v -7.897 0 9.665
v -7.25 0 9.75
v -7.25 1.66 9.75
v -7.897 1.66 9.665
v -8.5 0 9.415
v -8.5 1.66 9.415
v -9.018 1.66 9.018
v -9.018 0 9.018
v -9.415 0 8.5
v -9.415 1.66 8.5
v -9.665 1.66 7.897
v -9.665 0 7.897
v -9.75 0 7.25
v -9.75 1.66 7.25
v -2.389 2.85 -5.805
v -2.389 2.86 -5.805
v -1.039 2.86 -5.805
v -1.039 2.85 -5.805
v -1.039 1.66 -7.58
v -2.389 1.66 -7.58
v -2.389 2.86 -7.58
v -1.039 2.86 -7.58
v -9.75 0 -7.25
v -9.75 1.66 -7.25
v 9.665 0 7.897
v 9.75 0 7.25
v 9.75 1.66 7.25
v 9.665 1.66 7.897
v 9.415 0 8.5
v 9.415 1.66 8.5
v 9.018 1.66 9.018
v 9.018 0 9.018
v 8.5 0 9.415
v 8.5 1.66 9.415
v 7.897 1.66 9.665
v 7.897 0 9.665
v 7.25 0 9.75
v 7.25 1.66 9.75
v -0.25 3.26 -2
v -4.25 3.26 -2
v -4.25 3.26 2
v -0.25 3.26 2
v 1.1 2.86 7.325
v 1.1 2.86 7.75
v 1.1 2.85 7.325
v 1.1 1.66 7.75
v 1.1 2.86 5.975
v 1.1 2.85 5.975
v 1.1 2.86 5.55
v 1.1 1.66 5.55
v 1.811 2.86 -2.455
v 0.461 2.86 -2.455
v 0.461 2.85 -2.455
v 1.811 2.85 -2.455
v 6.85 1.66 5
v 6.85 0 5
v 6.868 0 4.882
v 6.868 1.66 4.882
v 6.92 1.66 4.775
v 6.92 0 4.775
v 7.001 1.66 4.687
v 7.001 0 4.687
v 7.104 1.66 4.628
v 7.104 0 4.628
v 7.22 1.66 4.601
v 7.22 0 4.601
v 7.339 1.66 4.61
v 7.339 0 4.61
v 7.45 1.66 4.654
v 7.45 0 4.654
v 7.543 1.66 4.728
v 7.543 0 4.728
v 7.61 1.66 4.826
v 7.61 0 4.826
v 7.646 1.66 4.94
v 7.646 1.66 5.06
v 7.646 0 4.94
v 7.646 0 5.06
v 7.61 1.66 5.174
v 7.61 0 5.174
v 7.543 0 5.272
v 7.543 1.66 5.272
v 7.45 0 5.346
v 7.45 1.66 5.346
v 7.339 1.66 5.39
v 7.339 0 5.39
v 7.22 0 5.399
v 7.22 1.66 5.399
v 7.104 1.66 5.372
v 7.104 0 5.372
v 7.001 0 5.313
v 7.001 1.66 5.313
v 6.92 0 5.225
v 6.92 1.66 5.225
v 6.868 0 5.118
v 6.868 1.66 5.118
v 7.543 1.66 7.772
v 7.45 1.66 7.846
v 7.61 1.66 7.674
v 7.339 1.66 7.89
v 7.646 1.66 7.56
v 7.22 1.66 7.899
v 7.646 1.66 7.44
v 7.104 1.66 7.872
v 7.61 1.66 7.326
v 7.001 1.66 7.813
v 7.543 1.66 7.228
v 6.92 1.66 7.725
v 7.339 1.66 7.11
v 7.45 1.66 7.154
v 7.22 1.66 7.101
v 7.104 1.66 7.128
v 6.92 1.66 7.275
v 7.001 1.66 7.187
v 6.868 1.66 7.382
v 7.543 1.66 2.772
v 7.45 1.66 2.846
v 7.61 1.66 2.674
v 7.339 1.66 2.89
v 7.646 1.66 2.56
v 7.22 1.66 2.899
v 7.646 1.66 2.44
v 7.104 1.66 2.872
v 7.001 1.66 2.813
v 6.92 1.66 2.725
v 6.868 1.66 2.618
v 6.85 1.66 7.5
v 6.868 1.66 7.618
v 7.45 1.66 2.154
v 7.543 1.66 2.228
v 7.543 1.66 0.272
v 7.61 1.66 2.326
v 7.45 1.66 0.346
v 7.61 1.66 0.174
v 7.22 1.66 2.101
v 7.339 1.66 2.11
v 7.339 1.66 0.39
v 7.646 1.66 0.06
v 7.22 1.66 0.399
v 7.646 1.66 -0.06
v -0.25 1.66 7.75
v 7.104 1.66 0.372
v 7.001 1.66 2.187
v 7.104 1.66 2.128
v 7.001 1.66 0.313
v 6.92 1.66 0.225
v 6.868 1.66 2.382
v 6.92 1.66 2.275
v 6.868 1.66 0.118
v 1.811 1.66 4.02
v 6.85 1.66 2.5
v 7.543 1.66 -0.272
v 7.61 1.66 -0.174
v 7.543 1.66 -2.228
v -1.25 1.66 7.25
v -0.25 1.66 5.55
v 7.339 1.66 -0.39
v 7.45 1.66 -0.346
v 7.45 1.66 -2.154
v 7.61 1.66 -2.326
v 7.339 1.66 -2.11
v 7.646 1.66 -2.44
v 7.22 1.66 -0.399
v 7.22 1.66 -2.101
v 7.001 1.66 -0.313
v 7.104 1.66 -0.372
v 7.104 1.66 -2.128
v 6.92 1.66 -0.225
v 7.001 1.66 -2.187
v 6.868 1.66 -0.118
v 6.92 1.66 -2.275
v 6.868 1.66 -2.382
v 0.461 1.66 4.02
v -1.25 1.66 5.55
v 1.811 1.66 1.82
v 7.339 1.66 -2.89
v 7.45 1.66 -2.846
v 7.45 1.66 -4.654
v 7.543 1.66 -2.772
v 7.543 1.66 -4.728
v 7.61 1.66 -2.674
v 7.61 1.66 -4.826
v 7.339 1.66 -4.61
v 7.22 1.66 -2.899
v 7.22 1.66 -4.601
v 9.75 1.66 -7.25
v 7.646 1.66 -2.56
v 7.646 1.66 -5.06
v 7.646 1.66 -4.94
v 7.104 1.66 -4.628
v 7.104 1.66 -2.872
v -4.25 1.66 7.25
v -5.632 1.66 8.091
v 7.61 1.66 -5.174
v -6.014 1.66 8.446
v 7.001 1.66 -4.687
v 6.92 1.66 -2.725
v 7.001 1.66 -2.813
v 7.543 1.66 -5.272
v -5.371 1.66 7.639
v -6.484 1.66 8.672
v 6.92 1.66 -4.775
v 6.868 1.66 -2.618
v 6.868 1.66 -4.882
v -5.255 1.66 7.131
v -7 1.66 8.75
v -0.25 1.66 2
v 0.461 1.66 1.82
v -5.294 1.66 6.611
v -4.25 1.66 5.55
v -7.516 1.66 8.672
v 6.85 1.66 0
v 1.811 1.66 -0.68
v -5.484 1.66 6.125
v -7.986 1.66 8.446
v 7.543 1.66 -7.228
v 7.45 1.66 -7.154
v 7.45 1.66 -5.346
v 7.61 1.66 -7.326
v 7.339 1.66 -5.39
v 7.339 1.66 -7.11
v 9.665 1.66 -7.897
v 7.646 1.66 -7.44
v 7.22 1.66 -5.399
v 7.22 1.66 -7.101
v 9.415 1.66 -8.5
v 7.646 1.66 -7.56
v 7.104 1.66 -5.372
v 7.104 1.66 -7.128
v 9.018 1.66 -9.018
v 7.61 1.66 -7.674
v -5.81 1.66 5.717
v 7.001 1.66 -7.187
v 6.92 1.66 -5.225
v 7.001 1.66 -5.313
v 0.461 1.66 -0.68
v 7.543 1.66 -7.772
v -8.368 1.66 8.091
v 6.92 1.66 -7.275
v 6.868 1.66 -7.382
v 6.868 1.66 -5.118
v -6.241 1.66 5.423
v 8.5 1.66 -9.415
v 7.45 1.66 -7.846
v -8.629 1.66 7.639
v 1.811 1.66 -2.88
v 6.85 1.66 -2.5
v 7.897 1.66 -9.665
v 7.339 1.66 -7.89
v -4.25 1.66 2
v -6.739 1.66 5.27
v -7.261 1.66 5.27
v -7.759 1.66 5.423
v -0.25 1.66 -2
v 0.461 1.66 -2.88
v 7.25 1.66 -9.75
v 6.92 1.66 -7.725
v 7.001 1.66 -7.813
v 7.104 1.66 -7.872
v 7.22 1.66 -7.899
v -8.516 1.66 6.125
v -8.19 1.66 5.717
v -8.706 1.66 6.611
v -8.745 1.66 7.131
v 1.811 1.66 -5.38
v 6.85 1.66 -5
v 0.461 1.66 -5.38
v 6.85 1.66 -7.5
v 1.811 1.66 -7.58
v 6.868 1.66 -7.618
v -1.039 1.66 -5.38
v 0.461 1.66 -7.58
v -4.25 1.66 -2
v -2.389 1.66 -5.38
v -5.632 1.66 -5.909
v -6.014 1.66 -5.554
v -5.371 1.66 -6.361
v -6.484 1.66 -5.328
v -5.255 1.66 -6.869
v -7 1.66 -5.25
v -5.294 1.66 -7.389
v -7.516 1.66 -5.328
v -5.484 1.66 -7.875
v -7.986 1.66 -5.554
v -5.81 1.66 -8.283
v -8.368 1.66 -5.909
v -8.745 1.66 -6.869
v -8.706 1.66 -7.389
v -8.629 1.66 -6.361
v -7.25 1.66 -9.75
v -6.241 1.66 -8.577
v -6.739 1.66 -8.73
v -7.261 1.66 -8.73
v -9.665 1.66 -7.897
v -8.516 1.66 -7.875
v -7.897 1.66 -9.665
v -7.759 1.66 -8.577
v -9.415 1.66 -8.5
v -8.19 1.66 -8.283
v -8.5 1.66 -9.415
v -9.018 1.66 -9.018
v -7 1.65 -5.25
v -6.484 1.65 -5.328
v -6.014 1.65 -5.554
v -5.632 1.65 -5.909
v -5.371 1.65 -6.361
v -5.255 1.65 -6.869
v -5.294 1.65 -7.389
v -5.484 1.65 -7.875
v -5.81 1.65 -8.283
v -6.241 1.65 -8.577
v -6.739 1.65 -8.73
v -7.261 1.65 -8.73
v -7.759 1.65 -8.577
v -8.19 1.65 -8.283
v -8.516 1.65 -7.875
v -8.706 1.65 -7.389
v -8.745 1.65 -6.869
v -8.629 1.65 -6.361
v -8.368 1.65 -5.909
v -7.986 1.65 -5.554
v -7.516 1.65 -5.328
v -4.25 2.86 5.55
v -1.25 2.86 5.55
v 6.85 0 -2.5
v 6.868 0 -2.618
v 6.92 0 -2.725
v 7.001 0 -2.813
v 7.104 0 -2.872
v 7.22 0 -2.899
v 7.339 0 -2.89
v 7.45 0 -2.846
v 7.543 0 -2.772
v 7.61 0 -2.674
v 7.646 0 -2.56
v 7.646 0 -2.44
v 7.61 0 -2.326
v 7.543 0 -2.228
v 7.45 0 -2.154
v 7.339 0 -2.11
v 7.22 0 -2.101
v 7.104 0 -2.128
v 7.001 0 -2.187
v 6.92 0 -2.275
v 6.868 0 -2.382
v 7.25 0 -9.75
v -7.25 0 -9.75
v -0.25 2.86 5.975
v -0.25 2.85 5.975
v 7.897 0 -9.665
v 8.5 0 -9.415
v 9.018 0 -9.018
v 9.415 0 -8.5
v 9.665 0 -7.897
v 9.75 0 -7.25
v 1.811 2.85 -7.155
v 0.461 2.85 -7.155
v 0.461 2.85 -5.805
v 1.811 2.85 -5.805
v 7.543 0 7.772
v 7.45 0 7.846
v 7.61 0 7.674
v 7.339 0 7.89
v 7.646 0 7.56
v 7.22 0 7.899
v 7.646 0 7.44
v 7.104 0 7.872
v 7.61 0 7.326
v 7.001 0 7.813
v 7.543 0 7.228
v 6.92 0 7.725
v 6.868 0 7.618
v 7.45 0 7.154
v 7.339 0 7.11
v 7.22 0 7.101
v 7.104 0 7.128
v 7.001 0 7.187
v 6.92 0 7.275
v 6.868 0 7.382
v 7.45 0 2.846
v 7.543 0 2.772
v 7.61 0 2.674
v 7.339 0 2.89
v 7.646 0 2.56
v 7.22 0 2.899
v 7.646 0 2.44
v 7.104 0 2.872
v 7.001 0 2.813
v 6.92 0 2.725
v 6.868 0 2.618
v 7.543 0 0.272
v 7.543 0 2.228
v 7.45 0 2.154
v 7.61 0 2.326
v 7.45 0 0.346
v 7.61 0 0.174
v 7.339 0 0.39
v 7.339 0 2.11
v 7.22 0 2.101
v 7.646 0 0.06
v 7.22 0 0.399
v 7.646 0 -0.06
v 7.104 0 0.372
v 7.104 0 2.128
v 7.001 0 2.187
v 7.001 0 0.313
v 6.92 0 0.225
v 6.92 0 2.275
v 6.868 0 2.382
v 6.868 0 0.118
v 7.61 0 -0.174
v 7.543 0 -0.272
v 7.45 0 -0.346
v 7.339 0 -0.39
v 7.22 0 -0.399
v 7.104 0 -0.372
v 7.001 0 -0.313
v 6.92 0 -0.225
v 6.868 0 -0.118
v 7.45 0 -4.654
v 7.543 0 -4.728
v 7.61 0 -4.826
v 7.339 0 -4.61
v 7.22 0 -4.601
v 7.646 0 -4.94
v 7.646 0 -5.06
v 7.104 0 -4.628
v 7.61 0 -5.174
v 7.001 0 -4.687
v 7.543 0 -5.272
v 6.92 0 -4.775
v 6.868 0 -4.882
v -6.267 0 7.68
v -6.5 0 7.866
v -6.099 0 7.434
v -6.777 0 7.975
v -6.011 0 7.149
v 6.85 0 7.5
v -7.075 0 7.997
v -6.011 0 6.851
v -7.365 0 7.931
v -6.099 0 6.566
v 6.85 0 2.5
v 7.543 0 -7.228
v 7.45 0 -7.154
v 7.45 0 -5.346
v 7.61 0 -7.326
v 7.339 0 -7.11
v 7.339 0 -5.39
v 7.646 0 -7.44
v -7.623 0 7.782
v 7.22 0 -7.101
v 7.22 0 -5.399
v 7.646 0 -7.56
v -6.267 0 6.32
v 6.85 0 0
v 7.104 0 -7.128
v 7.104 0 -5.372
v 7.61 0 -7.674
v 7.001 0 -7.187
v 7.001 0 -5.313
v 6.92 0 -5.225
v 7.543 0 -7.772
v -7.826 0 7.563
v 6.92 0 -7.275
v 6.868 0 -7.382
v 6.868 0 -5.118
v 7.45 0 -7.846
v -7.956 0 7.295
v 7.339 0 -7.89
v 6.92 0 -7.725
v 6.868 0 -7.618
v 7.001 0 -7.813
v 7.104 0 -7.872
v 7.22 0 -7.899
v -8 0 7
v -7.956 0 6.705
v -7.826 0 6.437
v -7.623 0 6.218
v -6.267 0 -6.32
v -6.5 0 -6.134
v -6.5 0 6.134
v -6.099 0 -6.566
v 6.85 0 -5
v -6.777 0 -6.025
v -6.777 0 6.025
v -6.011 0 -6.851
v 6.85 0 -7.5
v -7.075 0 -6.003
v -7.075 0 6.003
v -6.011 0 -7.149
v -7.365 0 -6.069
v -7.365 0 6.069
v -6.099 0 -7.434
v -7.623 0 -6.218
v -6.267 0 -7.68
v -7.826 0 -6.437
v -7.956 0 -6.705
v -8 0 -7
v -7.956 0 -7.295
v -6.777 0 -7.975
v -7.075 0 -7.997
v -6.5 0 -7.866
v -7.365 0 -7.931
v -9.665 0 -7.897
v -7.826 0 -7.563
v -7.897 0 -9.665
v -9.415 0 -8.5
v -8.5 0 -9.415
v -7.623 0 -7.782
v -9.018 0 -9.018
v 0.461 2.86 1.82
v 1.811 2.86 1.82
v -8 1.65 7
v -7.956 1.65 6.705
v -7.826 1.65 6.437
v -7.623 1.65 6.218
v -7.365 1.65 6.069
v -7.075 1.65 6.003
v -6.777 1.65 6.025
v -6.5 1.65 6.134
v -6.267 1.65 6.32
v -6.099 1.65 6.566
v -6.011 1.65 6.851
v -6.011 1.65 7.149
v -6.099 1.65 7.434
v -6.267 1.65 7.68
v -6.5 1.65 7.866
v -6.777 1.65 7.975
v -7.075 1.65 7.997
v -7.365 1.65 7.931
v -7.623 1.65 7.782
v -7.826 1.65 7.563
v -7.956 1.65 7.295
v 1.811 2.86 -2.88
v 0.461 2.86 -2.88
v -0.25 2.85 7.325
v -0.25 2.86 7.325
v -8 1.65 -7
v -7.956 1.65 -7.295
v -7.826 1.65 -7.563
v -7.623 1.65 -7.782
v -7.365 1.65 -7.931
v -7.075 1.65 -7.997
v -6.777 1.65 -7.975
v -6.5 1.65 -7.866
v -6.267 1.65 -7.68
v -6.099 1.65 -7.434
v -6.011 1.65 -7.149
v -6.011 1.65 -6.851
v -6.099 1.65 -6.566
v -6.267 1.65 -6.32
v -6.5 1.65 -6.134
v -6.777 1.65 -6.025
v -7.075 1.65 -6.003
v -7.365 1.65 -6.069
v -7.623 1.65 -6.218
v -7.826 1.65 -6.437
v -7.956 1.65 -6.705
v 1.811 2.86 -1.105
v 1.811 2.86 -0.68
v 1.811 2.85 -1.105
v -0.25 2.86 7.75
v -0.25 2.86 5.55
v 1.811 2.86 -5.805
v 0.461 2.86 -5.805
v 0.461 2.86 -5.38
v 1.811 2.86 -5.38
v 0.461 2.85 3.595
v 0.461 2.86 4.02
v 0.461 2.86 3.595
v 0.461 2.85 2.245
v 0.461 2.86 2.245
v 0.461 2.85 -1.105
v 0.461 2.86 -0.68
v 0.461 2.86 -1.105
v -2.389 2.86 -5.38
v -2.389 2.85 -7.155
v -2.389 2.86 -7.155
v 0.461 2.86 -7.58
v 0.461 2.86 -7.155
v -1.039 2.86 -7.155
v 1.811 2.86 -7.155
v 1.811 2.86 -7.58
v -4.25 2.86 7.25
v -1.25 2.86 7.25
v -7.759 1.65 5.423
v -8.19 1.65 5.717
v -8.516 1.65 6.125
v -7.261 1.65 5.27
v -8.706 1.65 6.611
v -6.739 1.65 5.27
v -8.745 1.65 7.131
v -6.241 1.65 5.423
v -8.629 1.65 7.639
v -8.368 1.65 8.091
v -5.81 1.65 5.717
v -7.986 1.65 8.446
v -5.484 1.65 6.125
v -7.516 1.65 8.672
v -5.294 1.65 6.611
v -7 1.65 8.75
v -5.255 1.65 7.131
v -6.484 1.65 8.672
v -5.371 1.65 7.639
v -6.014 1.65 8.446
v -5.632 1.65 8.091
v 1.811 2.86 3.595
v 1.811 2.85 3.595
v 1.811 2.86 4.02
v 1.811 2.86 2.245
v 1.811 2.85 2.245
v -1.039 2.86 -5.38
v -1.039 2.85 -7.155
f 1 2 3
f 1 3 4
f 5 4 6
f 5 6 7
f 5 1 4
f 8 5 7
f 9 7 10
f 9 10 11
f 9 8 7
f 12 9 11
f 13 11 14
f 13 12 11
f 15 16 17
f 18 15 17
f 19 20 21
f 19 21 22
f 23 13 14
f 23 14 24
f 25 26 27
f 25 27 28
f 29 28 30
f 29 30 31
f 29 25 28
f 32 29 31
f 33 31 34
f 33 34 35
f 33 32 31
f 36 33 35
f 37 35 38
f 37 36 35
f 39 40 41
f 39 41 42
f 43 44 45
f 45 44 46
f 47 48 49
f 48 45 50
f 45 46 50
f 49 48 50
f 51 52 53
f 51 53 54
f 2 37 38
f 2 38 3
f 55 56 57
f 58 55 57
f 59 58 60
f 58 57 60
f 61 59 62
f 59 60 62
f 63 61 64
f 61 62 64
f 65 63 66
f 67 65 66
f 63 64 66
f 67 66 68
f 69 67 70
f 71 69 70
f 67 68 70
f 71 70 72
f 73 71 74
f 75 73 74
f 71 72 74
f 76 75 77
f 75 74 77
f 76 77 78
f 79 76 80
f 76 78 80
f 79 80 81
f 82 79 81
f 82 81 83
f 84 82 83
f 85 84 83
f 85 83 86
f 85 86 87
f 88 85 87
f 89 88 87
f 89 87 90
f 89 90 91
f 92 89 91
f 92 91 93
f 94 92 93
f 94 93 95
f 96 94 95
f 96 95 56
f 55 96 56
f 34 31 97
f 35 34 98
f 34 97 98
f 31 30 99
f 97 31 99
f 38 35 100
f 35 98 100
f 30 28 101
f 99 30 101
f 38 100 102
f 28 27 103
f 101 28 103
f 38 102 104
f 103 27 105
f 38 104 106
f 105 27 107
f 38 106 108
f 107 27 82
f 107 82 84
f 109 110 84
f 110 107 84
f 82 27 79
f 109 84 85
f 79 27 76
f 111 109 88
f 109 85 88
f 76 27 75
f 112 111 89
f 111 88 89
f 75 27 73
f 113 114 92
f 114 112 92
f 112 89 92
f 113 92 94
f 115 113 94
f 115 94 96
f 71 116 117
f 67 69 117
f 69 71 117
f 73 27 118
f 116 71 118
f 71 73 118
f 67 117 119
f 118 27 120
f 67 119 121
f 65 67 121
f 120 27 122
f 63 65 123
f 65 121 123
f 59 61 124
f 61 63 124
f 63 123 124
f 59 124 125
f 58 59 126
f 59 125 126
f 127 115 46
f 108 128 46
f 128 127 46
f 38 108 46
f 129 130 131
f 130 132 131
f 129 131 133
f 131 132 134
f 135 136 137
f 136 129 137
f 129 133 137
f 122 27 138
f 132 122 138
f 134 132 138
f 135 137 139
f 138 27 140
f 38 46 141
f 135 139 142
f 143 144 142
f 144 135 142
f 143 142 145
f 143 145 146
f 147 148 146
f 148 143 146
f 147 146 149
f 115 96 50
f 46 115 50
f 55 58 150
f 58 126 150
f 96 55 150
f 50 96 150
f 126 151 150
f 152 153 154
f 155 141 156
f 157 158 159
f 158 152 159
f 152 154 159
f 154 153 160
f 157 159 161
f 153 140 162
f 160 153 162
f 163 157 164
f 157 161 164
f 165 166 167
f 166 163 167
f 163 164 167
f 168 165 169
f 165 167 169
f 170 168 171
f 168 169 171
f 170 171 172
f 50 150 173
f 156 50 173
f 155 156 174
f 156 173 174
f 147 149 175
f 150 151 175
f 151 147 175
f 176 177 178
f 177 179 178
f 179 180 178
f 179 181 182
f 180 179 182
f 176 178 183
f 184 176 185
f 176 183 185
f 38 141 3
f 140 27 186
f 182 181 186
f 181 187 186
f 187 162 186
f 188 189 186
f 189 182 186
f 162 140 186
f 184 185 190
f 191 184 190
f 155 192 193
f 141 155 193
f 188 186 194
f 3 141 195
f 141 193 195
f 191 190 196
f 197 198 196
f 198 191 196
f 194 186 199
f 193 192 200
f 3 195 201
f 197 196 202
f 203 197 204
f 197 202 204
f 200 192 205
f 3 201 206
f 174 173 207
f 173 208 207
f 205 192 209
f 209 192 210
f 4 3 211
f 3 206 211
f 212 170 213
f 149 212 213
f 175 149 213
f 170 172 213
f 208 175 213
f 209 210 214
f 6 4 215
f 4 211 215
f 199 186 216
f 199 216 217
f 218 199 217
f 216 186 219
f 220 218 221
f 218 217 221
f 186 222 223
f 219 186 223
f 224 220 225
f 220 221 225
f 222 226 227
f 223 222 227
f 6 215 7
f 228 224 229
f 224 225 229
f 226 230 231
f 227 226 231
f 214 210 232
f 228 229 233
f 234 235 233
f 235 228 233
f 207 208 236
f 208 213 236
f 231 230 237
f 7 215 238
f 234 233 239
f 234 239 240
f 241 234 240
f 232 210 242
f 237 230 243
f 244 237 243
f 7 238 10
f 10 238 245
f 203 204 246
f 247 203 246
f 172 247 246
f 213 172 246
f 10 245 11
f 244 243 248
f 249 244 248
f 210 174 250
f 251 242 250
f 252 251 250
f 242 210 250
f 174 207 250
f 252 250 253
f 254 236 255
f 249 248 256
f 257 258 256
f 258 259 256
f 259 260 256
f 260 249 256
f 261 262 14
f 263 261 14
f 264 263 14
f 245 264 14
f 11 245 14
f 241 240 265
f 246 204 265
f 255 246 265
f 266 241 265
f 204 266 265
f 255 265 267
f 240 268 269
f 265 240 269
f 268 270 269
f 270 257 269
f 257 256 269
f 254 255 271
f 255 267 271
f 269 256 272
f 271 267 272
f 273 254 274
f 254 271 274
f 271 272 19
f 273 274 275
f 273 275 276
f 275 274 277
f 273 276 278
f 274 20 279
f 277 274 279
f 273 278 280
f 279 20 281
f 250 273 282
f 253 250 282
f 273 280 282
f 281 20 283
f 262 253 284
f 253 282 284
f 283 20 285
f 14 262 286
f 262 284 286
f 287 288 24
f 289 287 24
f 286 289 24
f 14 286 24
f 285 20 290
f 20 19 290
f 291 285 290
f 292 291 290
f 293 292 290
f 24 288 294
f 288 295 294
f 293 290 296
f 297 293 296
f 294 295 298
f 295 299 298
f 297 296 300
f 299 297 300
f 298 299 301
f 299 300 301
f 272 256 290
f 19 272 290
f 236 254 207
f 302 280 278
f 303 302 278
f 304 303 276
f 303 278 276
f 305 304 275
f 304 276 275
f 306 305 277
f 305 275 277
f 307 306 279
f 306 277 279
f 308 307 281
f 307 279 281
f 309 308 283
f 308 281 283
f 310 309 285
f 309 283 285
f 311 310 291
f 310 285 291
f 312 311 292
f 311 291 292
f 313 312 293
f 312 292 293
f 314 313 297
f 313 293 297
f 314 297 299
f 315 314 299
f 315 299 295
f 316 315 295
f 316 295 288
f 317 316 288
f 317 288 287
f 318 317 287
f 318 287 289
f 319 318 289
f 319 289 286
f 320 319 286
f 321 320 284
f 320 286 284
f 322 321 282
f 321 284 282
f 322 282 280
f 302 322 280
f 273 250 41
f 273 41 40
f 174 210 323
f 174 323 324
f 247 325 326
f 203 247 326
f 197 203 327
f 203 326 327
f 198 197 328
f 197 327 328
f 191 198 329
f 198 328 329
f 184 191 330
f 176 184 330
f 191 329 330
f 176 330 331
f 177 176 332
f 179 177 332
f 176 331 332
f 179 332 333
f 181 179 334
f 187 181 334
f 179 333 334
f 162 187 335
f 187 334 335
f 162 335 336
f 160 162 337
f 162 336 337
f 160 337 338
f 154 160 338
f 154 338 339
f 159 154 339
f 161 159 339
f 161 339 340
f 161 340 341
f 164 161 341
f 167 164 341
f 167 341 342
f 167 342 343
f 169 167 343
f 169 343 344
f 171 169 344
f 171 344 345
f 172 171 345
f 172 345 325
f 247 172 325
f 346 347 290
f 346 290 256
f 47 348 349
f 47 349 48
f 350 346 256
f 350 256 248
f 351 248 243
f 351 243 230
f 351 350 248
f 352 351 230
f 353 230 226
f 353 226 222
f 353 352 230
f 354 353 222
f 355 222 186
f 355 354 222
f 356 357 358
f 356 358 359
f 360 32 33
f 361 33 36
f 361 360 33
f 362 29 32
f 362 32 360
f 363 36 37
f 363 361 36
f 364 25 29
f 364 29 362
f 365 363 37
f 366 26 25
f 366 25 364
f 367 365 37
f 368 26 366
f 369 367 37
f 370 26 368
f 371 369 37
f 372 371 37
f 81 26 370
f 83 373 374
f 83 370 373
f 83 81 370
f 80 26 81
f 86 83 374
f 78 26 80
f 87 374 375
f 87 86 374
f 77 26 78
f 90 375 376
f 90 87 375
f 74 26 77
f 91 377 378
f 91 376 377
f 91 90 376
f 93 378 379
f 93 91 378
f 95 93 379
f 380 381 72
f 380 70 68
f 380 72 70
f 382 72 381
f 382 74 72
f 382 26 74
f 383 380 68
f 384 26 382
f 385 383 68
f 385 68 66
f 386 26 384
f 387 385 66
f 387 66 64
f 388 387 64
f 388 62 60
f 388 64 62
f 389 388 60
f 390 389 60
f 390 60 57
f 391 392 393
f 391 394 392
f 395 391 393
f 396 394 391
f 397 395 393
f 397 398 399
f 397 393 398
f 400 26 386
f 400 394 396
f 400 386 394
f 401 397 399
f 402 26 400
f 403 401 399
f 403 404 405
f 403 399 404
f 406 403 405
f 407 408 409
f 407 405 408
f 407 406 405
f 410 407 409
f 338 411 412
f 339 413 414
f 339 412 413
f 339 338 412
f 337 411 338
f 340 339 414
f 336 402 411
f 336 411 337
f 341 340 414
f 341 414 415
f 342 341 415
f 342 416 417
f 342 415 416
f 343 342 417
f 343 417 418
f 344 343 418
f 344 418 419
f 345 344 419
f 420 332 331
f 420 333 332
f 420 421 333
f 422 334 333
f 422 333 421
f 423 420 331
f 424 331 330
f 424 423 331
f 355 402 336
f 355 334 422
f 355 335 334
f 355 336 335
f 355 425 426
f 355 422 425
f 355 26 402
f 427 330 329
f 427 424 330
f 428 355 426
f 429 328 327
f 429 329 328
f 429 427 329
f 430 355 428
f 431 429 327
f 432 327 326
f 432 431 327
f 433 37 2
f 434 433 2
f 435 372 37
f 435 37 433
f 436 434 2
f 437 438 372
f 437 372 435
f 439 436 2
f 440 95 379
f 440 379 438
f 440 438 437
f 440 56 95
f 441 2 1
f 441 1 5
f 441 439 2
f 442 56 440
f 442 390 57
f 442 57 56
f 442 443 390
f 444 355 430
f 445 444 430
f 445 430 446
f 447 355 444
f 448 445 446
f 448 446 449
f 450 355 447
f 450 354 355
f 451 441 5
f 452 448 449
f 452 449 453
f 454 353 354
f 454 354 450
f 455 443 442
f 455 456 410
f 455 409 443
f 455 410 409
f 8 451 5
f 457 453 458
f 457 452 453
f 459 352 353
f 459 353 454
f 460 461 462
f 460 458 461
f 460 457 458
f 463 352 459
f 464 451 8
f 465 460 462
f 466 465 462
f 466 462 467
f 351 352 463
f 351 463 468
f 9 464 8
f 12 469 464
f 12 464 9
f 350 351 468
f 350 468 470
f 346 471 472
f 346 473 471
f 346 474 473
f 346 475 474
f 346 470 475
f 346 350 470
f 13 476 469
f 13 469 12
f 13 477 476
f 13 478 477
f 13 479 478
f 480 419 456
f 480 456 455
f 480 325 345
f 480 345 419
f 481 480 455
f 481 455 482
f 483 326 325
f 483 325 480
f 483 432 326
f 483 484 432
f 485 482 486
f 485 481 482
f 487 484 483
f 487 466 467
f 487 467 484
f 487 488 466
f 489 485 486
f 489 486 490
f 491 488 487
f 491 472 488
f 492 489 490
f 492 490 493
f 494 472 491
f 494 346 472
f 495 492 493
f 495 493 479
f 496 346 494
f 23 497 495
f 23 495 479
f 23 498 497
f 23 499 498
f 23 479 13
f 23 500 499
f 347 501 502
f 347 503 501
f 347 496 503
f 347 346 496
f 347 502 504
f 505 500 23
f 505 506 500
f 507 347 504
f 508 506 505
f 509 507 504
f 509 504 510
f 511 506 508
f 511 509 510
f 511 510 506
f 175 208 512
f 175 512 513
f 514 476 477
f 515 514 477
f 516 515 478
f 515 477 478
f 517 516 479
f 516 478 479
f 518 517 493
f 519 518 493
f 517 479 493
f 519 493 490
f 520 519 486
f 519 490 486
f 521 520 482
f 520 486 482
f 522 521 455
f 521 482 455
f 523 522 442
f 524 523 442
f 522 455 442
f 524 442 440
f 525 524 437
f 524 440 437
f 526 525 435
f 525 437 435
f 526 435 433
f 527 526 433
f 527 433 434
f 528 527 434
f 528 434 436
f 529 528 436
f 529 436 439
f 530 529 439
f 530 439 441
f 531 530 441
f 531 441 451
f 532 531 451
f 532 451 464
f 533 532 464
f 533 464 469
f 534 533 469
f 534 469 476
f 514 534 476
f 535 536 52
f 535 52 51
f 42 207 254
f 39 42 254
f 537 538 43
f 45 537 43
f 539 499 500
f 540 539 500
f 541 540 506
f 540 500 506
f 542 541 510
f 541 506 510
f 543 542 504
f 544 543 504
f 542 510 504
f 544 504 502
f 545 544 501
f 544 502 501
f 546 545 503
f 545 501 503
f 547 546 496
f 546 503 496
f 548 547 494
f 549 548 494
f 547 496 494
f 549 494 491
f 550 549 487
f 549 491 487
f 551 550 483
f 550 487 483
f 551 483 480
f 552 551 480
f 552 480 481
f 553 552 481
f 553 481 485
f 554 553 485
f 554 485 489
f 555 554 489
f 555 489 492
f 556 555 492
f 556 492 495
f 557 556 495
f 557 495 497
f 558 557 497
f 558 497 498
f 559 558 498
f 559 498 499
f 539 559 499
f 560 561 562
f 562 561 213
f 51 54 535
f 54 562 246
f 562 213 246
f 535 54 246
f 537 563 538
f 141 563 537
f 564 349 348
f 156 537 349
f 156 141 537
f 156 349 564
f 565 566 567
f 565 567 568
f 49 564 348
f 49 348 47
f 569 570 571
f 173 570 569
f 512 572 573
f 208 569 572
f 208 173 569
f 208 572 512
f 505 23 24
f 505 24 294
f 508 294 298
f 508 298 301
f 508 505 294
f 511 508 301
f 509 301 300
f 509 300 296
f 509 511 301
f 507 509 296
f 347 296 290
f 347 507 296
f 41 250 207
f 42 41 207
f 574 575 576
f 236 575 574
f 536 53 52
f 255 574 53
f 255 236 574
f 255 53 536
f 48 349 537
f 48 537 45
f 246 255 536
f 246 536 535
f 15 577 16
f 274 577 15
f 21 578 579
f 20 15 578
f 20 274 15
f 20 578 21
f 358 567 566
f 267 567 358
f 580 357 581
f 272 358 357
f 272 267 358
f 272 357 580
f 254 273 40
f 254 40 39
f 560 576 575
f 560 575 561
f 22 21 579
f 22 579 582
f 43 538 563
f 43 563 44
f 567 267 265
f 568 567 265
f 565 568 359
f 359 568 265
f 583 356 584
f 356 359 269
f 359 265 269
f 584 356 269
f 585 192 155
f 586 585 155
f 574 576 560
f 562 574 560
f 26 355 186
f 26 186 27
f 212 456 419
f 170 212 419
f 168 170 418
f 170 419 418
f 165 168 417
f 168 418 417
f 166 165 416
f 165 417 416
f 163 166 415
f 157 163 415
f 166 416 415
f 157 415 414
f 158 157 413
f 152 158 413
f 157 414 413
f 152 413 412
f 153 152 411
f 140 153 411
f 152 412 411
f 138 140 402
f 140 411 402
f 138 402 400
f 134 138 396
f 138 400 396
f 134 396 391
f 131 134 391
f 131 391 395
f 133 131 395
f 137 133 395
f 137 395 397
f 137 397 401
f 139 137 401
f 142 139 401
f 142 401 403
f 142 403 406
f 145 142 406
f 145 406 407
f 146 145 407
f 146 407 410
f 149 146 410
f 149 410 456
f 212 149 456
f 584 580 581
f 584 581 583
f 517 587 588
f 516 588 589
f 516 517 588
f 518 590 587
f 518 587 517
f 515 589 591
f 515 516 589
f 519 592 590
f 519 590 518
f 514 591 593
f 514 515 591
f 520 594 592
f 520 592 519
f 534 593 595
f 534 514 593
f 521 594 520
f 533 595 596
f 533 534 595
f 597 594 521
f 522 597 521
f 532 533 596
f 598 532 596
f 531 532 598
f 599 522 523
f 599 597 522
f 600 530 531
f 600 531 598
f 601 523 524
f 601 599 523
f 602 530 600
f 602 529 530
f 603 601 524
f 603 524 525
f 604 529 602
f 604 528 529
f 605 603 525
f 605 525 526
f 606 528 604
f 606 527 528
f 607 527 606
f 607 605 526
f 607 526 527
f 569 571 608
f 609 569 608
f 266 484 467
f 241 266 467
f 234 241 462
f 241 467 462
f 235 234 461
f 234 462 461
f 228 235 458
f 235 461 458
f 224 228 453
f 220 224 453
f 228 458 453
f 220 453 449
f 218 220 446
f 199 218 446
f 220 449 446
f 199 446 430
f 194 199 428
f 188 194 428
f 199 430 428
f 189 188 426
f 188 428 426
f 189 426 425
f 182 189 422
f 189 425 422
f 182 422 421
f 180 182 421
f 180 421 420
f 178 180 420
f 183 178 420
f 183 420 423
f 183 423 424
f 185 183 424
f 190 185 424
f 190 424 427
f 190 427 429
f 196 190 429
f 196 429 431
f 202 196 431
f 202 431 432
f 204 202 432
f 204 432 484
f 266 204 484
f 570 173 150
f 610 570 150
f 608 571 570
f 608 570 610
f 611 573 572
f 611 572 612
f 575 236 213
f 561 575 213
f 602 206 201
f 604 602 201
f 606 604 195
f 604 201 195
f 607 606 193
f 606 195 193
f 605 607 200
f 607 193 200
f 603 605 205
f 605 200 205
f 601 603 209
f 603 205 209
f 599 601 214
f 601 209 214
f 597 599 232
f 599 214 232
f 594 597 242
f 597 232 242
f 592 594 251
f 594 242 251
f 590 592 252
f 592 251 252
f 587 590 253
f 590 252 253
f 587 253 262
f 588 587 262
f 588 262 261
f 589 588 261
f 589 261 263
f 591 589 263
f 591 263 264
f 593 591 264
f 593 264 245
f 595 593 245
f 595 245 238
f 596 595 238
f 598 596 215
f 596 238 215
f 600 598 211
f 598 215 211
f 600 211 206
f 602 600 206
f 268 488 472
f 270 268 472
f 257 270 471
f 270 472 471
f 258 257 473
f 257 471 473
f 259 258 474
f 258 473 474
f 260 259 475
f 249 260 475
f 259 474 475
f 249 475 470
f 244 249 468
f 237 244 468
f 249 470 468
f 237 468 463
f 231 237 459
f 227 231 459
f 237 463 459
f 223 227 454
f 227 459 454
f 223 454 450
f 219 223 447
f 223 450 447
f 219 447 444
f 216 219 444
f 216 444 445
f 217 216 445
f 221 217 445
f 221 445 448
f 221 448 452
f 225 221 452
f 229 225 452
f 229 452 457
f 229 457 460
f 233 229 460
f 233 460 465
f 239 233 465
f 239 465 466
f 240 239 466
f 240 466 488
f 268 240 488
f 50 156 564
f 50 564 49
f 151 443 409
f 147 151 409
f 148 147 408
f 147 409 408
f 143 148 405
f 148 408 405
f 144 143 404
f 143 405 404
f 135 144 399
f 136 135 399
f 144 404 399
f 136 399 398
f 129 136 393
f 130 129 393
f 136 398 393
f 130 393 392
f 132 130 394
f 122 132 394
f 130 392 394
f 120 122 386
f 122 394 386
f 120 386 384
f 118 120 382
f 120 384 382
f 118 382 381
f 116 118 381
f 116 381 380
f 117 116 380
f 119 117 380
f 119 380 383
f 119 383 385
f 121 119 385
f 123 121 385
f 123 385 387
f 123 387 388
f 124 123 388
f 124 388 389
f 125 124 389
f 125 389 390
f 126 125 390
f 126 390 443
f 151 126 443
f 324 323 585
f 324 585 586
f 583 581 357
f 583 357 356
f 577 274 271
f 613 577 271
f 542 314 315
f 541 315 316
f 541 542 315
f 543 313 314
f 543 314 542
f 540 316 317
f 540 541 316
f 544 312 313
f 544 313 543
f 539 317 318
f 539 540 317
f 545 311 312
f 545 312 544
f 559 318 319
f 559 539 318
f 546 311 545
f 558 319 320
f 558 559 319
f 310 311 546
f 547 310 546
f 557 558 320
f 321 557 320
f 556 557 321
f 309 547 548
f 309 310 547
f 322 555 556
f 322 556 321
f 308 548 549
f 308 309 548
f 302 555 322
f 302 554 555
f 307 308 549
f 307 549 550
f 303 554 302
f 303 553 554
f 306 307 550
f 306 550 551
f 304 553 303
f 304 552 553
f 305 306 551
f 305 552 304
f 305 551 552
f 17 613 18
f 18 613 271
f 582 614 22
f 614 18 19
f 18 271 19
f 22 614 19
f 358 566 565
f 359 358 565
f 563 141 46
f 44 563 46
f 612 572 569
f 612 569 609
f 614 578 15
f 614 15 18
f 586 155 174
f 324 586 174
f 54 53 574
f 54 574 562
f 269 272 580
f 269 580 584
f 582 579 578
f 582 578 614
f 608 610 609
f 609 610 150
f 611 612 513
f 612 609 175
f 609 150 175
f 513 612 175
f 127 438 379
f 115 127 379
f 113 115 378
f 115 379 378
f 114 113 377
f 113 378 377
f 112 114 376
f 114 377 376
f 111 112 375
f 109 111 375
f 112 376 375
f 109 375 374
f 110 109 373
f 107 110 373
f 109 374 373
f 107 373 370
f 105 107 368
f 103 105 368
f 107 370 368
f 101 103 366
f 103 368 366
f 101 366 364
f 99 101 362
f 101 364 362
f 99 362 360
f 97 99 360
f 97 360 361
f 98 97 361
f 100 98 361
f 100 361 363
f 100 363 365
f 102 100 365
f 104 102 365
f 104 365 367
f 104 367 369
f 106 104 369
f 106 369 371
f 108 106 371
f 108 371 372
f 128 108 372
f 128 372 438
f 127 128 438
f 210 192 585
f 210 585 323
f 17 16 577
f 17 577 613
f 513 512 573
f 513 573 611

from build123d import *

# Parameters (mm, degrees)
BOSS_EXTRU_1_DEPTH              = 1.66
DIAM_TRE_DU_PER_AGE_2_0_2_1_D   = 2
ESQUISSE4_R                     = 1.75
ENL_V_MAT_EXTRU_1_DEPTH         = 0.01
DIAM_TRE_DU_PER_AGE_0_8_0_8_1_D = 0.8
ESQUISSE7_W                     = 4
ESQUISSE7_H                     = 4
BOSS_EXTRU_2_DEPTH              = 1.6
ESQUISSE8_W                     = 3
ESQUISSE8_H                     = 1.7
BOSS_EXTRU_3_DEPTH              = 1.2
ESQUISSE9_W                     = 1.35
ESQUISSE9_H                     = 2.2
BOSS_EXTRU_4_DEPTH              = 1.2
ESQUISSE10_W                    = 1.35
ESQUISSE10_H                    = 1.35
ENL_V_MAT_EXTRU_2_DEPTH         = 0.01
ESQUISSE13_W                    = 1.35
ESQUISSE13_H                    = 2.2
BOSS_EXTRU_6_DEPTH              = 1.2
ESQUISSE15_W                    = 1.35
ESQUISSE15_H                    = 1.35
ENL_V_MAT_EXTRU_3_DEPTH         = 0.01
ESQUISSE18_W                    = 1.35
ESQUISSE18_H                    = 2.2
BOSS_EXTRU_7_DEPTH              = 1.2
ESQUISSE20_W                    = 1.35
ESQUISSE20_H                    = 1.35
ENL_V_MAT_EXTRU_5_DEPTH         = 0.01
ESQUISSE23_W                    = 1.35
ESQUISSE23_H                    = 2.2
BOSS_EXTRU_9_DEPTH              = 1.2
ESQUISSE25_W                    = 1.35
ESQUISSE25_H                    = 1.35
ENL_V_MAT_EXTRU_6_DEPTH         = 0.01
ESQUISSE27_W                    = 1.35
ESQUISSE27_H                    = 2.2
BOSS_EXTRU_10_DEPTH             = 1.2
ESQUISSE29_W                    = 1.35
ESQUISSE29_H                    = 1.35
ENL_V_MAT_EXTRU_7_DEPTH         = 0.01


with BuildPart() as part:
    # Esquisse1 → Boss.-Extru.1 (new body)
    with BuildSketch(Plane(origin=(0, 0, 0), x_dir=(1, 0, 0), z_dir=(0, 1, 0))):
        with BuildLine():
            Line((-7.25, 9.75), (7.25, 9.75))
            ThreePointArc((7.25, 9.75), (9.017766953, 9.017766953), (9.75, 7.25))
            Line((9.75, 7.25), (9.75, -7.25))
            ThreePointArc((9.75, -7.25), (9.017766953, -9.017766953), (7.25, -9.75))
            Line((7.25, -9.75), (-7.25, -9.75))
            ThreePointArc((-7.25, -9.75), (-9.017766953, -9.017766953), (-9.75, -7.25))
            Line((-9.75, -7.25), (-9.75, 7.25))
            ThreePointArc((-9.75, 7.25), (-9.017766953, 9.017766953), (-7.25, 9.75))
        make_face()
    extrude(amount=BOSS_EXTRU_1_DEPTH)

    # Diamètre du perçage Ø2.0 (2)1 (through all)
    with Locations(Plane(origin=(0, 1.66, 0), x_dir=(1, 0, 0), z_dir=(0, 1, 0))):
        with Locations((-7, -7), (-7, 7)):
            Hole(DIAM_TRE_DU_PER_AGE_2_0_2_1_D / 2)

    # Esquisse4 → Enlèv. mat.-Extru.1 (cut)
    with BuildSketch(Plane(origin=(0, 1.66, 0), x_dir=(1, 0, 0), z_dir=(0, 1, 0))):
        with Locations((-7, 7)):
            Circle(ESQUISSE4_R)
        with Locations((-7, -7)):
            Circle(ESQUISSE4_R)
    extrude(amount=-ENL_V_MAT_EXTRU_1_DEPTH, mode=Mode.SUBTRACT)

    # Diamètre du perçage Ø0.8 (0.8)1 (through all)
    with Locations(Plane(origin=(0, 1.66, 0), x_dir=(1, 0, 0), z_dir=(0, 1, 0))):
        with Locations((7.25, 7.5), (7.25, 5), (7.25, 2.5), (7.25, 0), (7.25, -2.5), (7.25, -5), (7.25, -7.5)):
            Hole(DIAM_TRE_DU_PER_AGE_0_8_0_8_1_D / 2)

    # Esquisse7 → Boss.-Extru.2 (add)
    with BuildSketch(Plane(origin=(0, 1.66, 0), x_dir=(1, 0, 0), z_dir=(0, 1, 0))):
        with Locations((-2.25, 0)):
            Rectangle(ESQUISSE7_W, ESQUISSE7_H)
    extrude(amount=BOSS_EXTRU_2_DEPTH)

    # Esquisse8 → Boss.-Extru.3 (add)
    with BuildSketch(Plane(origin=(0, 1.66, 0), x_dir=(1, 0, 0), z_dir=(0, 1, 0))):
        with Locations((-2.75, -6.4)):
            Rectangle(ESQUISSE8_W, ESQUISSE8_H)
    extrude(amount=BOSS_EXTRU_3_DEPTH)

    # Esquisse9 → Boss.-Extru.4 (add)
    with BuildSketch(Plane(origin=(0, 1.66, 0), x_dir=(1, 0, 0), z_dir=(0, 1, 0))):
        with Locations((-1.713640357, 6.480344191)):
            Rectangle(ESQUISSE9_W, ESQUISSE9_H)
    extrude(amount=BOSS_EXTRU_4_DEPTH)

    # Esquisse10 → Enlèv. mat.-Extru.2 (cut)
    with BuildSketch(Plane(origin=(0, 2.86, 0), x_dir=(1, 0, 0), z_dir=(0, 1, 0))):
        with Locations((-1.713640357, 6.480344191)):
            Rectangle(ESQUISSE10_W, ESQUISSE10_H)
    extrude(amount=-ENL_V_MAT_EXTRU_2_DEPTH, mode=Mode.SUBTRACT)

    # Esquisse13 → Boss.-Extru.6 (add)
    with BuildSketch(Plane(origin=(5.041533198, 1.66, 0.171739912), x_dir=(1, 0, 0), z_dir=(0, 1, 0))):
        with Locations((-3.905173555, 6.652084103)):
            Rectangle(ESQUISSE13_W, ESQUISSE13_H)
    extrude(amount=BOSS_EXTRU_6_DEPTH)

    # Esquisse15 → Enlèv. mat.-Extru.3 (cut)
    with BuildSketch(Plane(origin=(5.041533198, 2.86, 0.171739912), x_dir=(1, 0, 0), z_dir=(0, 1, 0))):
        with Locations((-3.905173555, 6.652084103)):
            Rectangle(ESQUISSE15_W, ESQUISSE15_H)
    extrude(amount=-ENL_V_MAT_EXTRU_3_DEPTH, mode=Mode.SUBTRACT)

    # Esquisse18 → Boss.-Extru.7 (add)
    with BuildSketch(Plane(origin=(3.245250957, 1.66, 3.023332502), x_dir=(1, 0, 0), z_dir=(0, 1, 0))):
        with Locations((-2.108891314, 4.803676693)):
            Rectangle(ESQUISSE18_W, ESQUISSE18_H)
    extrude(amount=BOSS_EXTRU_7_DEPTH)

    # Esquisse20 → Enlèv. mat.-Extru.5 (cut)
    with BuildSketch(Plane(origin=(3.245250957, 2.86, 3.023332502), x_dir=(1, 0, 0), z_dir=(0, 1, 0))):
        with Locations((-2.108891314, 4.803676693)):
            Rectangle(ESQUISSE20_W, ESQUISSE20_H)
    extrude(amount=-ENL_V_MAT_EXTRU_5_DEPTH, mode=Mode.SUBTRACT)

    # Esquisse23 → Boss.-Extru.9 (add)
    with BuildSketch(Plane(origin=(5.945511171, 1.66, 6.874523991), x_dir=(1, 0, 0), z_dir=(0, 1, 0))):
        with Locations((-4.809151527, 3.954868182)):
            Rectangle(ESQUISSE23_W, ESQUISSE23_H)
    extrude(amount=BOSS_EXTRU_9_DEPTH)

    # Esquisse25 → Enlèv. mat.-Extru.6 (cut)
    with BuildSketch(Plane(origin=(5.945511171, 2.86, 6.874523991), x_dir=(1, 0, 0), z_dir=(0, 1, 0))):
        with Locations((-4.809151527, 3.954868182)):
            Rectangle(ESQUISSE25_W, ESQUISSE25_H)
    extrude(amount=-ENL_V_MAT_EXTRU_6_DEPTH, mode=Mode.SUBTRACT)

    # Esquisse27 → Boss.-Extru.10 (add)
    with BuildSketch(Plane(origin=(2.244432679, 1.66, 9.735089798), x_dir=(1, 0, 0), z_dir=(0, 1, 0))):
        with Locations((-1.819432679, 3.085089798)):
            Rectangle(ESQUISSE27_W, ESQUISSE27_H)
    extrude(amount=BOSS_EXTRU_10_DEPTH)

    # Esquisse29 → Enlèv. mat.-Extru.7 (cut)
    with BuildSketch(Plane(origin=(2.244432679, 2.86, 9.735089798), x_dir=(1, 0, 0), z_dir=(0, 1, 0))):
        with Locations((-1.819432679, 3.085089798)):
            Rectangle(ESQUISSE29_W, ESQUISSE29_H)
    extrude(amount=-ENL_V_MAT_EXTRU_7_DEPTH, mode=Mode.SUBTRACT)


solid = part.part
